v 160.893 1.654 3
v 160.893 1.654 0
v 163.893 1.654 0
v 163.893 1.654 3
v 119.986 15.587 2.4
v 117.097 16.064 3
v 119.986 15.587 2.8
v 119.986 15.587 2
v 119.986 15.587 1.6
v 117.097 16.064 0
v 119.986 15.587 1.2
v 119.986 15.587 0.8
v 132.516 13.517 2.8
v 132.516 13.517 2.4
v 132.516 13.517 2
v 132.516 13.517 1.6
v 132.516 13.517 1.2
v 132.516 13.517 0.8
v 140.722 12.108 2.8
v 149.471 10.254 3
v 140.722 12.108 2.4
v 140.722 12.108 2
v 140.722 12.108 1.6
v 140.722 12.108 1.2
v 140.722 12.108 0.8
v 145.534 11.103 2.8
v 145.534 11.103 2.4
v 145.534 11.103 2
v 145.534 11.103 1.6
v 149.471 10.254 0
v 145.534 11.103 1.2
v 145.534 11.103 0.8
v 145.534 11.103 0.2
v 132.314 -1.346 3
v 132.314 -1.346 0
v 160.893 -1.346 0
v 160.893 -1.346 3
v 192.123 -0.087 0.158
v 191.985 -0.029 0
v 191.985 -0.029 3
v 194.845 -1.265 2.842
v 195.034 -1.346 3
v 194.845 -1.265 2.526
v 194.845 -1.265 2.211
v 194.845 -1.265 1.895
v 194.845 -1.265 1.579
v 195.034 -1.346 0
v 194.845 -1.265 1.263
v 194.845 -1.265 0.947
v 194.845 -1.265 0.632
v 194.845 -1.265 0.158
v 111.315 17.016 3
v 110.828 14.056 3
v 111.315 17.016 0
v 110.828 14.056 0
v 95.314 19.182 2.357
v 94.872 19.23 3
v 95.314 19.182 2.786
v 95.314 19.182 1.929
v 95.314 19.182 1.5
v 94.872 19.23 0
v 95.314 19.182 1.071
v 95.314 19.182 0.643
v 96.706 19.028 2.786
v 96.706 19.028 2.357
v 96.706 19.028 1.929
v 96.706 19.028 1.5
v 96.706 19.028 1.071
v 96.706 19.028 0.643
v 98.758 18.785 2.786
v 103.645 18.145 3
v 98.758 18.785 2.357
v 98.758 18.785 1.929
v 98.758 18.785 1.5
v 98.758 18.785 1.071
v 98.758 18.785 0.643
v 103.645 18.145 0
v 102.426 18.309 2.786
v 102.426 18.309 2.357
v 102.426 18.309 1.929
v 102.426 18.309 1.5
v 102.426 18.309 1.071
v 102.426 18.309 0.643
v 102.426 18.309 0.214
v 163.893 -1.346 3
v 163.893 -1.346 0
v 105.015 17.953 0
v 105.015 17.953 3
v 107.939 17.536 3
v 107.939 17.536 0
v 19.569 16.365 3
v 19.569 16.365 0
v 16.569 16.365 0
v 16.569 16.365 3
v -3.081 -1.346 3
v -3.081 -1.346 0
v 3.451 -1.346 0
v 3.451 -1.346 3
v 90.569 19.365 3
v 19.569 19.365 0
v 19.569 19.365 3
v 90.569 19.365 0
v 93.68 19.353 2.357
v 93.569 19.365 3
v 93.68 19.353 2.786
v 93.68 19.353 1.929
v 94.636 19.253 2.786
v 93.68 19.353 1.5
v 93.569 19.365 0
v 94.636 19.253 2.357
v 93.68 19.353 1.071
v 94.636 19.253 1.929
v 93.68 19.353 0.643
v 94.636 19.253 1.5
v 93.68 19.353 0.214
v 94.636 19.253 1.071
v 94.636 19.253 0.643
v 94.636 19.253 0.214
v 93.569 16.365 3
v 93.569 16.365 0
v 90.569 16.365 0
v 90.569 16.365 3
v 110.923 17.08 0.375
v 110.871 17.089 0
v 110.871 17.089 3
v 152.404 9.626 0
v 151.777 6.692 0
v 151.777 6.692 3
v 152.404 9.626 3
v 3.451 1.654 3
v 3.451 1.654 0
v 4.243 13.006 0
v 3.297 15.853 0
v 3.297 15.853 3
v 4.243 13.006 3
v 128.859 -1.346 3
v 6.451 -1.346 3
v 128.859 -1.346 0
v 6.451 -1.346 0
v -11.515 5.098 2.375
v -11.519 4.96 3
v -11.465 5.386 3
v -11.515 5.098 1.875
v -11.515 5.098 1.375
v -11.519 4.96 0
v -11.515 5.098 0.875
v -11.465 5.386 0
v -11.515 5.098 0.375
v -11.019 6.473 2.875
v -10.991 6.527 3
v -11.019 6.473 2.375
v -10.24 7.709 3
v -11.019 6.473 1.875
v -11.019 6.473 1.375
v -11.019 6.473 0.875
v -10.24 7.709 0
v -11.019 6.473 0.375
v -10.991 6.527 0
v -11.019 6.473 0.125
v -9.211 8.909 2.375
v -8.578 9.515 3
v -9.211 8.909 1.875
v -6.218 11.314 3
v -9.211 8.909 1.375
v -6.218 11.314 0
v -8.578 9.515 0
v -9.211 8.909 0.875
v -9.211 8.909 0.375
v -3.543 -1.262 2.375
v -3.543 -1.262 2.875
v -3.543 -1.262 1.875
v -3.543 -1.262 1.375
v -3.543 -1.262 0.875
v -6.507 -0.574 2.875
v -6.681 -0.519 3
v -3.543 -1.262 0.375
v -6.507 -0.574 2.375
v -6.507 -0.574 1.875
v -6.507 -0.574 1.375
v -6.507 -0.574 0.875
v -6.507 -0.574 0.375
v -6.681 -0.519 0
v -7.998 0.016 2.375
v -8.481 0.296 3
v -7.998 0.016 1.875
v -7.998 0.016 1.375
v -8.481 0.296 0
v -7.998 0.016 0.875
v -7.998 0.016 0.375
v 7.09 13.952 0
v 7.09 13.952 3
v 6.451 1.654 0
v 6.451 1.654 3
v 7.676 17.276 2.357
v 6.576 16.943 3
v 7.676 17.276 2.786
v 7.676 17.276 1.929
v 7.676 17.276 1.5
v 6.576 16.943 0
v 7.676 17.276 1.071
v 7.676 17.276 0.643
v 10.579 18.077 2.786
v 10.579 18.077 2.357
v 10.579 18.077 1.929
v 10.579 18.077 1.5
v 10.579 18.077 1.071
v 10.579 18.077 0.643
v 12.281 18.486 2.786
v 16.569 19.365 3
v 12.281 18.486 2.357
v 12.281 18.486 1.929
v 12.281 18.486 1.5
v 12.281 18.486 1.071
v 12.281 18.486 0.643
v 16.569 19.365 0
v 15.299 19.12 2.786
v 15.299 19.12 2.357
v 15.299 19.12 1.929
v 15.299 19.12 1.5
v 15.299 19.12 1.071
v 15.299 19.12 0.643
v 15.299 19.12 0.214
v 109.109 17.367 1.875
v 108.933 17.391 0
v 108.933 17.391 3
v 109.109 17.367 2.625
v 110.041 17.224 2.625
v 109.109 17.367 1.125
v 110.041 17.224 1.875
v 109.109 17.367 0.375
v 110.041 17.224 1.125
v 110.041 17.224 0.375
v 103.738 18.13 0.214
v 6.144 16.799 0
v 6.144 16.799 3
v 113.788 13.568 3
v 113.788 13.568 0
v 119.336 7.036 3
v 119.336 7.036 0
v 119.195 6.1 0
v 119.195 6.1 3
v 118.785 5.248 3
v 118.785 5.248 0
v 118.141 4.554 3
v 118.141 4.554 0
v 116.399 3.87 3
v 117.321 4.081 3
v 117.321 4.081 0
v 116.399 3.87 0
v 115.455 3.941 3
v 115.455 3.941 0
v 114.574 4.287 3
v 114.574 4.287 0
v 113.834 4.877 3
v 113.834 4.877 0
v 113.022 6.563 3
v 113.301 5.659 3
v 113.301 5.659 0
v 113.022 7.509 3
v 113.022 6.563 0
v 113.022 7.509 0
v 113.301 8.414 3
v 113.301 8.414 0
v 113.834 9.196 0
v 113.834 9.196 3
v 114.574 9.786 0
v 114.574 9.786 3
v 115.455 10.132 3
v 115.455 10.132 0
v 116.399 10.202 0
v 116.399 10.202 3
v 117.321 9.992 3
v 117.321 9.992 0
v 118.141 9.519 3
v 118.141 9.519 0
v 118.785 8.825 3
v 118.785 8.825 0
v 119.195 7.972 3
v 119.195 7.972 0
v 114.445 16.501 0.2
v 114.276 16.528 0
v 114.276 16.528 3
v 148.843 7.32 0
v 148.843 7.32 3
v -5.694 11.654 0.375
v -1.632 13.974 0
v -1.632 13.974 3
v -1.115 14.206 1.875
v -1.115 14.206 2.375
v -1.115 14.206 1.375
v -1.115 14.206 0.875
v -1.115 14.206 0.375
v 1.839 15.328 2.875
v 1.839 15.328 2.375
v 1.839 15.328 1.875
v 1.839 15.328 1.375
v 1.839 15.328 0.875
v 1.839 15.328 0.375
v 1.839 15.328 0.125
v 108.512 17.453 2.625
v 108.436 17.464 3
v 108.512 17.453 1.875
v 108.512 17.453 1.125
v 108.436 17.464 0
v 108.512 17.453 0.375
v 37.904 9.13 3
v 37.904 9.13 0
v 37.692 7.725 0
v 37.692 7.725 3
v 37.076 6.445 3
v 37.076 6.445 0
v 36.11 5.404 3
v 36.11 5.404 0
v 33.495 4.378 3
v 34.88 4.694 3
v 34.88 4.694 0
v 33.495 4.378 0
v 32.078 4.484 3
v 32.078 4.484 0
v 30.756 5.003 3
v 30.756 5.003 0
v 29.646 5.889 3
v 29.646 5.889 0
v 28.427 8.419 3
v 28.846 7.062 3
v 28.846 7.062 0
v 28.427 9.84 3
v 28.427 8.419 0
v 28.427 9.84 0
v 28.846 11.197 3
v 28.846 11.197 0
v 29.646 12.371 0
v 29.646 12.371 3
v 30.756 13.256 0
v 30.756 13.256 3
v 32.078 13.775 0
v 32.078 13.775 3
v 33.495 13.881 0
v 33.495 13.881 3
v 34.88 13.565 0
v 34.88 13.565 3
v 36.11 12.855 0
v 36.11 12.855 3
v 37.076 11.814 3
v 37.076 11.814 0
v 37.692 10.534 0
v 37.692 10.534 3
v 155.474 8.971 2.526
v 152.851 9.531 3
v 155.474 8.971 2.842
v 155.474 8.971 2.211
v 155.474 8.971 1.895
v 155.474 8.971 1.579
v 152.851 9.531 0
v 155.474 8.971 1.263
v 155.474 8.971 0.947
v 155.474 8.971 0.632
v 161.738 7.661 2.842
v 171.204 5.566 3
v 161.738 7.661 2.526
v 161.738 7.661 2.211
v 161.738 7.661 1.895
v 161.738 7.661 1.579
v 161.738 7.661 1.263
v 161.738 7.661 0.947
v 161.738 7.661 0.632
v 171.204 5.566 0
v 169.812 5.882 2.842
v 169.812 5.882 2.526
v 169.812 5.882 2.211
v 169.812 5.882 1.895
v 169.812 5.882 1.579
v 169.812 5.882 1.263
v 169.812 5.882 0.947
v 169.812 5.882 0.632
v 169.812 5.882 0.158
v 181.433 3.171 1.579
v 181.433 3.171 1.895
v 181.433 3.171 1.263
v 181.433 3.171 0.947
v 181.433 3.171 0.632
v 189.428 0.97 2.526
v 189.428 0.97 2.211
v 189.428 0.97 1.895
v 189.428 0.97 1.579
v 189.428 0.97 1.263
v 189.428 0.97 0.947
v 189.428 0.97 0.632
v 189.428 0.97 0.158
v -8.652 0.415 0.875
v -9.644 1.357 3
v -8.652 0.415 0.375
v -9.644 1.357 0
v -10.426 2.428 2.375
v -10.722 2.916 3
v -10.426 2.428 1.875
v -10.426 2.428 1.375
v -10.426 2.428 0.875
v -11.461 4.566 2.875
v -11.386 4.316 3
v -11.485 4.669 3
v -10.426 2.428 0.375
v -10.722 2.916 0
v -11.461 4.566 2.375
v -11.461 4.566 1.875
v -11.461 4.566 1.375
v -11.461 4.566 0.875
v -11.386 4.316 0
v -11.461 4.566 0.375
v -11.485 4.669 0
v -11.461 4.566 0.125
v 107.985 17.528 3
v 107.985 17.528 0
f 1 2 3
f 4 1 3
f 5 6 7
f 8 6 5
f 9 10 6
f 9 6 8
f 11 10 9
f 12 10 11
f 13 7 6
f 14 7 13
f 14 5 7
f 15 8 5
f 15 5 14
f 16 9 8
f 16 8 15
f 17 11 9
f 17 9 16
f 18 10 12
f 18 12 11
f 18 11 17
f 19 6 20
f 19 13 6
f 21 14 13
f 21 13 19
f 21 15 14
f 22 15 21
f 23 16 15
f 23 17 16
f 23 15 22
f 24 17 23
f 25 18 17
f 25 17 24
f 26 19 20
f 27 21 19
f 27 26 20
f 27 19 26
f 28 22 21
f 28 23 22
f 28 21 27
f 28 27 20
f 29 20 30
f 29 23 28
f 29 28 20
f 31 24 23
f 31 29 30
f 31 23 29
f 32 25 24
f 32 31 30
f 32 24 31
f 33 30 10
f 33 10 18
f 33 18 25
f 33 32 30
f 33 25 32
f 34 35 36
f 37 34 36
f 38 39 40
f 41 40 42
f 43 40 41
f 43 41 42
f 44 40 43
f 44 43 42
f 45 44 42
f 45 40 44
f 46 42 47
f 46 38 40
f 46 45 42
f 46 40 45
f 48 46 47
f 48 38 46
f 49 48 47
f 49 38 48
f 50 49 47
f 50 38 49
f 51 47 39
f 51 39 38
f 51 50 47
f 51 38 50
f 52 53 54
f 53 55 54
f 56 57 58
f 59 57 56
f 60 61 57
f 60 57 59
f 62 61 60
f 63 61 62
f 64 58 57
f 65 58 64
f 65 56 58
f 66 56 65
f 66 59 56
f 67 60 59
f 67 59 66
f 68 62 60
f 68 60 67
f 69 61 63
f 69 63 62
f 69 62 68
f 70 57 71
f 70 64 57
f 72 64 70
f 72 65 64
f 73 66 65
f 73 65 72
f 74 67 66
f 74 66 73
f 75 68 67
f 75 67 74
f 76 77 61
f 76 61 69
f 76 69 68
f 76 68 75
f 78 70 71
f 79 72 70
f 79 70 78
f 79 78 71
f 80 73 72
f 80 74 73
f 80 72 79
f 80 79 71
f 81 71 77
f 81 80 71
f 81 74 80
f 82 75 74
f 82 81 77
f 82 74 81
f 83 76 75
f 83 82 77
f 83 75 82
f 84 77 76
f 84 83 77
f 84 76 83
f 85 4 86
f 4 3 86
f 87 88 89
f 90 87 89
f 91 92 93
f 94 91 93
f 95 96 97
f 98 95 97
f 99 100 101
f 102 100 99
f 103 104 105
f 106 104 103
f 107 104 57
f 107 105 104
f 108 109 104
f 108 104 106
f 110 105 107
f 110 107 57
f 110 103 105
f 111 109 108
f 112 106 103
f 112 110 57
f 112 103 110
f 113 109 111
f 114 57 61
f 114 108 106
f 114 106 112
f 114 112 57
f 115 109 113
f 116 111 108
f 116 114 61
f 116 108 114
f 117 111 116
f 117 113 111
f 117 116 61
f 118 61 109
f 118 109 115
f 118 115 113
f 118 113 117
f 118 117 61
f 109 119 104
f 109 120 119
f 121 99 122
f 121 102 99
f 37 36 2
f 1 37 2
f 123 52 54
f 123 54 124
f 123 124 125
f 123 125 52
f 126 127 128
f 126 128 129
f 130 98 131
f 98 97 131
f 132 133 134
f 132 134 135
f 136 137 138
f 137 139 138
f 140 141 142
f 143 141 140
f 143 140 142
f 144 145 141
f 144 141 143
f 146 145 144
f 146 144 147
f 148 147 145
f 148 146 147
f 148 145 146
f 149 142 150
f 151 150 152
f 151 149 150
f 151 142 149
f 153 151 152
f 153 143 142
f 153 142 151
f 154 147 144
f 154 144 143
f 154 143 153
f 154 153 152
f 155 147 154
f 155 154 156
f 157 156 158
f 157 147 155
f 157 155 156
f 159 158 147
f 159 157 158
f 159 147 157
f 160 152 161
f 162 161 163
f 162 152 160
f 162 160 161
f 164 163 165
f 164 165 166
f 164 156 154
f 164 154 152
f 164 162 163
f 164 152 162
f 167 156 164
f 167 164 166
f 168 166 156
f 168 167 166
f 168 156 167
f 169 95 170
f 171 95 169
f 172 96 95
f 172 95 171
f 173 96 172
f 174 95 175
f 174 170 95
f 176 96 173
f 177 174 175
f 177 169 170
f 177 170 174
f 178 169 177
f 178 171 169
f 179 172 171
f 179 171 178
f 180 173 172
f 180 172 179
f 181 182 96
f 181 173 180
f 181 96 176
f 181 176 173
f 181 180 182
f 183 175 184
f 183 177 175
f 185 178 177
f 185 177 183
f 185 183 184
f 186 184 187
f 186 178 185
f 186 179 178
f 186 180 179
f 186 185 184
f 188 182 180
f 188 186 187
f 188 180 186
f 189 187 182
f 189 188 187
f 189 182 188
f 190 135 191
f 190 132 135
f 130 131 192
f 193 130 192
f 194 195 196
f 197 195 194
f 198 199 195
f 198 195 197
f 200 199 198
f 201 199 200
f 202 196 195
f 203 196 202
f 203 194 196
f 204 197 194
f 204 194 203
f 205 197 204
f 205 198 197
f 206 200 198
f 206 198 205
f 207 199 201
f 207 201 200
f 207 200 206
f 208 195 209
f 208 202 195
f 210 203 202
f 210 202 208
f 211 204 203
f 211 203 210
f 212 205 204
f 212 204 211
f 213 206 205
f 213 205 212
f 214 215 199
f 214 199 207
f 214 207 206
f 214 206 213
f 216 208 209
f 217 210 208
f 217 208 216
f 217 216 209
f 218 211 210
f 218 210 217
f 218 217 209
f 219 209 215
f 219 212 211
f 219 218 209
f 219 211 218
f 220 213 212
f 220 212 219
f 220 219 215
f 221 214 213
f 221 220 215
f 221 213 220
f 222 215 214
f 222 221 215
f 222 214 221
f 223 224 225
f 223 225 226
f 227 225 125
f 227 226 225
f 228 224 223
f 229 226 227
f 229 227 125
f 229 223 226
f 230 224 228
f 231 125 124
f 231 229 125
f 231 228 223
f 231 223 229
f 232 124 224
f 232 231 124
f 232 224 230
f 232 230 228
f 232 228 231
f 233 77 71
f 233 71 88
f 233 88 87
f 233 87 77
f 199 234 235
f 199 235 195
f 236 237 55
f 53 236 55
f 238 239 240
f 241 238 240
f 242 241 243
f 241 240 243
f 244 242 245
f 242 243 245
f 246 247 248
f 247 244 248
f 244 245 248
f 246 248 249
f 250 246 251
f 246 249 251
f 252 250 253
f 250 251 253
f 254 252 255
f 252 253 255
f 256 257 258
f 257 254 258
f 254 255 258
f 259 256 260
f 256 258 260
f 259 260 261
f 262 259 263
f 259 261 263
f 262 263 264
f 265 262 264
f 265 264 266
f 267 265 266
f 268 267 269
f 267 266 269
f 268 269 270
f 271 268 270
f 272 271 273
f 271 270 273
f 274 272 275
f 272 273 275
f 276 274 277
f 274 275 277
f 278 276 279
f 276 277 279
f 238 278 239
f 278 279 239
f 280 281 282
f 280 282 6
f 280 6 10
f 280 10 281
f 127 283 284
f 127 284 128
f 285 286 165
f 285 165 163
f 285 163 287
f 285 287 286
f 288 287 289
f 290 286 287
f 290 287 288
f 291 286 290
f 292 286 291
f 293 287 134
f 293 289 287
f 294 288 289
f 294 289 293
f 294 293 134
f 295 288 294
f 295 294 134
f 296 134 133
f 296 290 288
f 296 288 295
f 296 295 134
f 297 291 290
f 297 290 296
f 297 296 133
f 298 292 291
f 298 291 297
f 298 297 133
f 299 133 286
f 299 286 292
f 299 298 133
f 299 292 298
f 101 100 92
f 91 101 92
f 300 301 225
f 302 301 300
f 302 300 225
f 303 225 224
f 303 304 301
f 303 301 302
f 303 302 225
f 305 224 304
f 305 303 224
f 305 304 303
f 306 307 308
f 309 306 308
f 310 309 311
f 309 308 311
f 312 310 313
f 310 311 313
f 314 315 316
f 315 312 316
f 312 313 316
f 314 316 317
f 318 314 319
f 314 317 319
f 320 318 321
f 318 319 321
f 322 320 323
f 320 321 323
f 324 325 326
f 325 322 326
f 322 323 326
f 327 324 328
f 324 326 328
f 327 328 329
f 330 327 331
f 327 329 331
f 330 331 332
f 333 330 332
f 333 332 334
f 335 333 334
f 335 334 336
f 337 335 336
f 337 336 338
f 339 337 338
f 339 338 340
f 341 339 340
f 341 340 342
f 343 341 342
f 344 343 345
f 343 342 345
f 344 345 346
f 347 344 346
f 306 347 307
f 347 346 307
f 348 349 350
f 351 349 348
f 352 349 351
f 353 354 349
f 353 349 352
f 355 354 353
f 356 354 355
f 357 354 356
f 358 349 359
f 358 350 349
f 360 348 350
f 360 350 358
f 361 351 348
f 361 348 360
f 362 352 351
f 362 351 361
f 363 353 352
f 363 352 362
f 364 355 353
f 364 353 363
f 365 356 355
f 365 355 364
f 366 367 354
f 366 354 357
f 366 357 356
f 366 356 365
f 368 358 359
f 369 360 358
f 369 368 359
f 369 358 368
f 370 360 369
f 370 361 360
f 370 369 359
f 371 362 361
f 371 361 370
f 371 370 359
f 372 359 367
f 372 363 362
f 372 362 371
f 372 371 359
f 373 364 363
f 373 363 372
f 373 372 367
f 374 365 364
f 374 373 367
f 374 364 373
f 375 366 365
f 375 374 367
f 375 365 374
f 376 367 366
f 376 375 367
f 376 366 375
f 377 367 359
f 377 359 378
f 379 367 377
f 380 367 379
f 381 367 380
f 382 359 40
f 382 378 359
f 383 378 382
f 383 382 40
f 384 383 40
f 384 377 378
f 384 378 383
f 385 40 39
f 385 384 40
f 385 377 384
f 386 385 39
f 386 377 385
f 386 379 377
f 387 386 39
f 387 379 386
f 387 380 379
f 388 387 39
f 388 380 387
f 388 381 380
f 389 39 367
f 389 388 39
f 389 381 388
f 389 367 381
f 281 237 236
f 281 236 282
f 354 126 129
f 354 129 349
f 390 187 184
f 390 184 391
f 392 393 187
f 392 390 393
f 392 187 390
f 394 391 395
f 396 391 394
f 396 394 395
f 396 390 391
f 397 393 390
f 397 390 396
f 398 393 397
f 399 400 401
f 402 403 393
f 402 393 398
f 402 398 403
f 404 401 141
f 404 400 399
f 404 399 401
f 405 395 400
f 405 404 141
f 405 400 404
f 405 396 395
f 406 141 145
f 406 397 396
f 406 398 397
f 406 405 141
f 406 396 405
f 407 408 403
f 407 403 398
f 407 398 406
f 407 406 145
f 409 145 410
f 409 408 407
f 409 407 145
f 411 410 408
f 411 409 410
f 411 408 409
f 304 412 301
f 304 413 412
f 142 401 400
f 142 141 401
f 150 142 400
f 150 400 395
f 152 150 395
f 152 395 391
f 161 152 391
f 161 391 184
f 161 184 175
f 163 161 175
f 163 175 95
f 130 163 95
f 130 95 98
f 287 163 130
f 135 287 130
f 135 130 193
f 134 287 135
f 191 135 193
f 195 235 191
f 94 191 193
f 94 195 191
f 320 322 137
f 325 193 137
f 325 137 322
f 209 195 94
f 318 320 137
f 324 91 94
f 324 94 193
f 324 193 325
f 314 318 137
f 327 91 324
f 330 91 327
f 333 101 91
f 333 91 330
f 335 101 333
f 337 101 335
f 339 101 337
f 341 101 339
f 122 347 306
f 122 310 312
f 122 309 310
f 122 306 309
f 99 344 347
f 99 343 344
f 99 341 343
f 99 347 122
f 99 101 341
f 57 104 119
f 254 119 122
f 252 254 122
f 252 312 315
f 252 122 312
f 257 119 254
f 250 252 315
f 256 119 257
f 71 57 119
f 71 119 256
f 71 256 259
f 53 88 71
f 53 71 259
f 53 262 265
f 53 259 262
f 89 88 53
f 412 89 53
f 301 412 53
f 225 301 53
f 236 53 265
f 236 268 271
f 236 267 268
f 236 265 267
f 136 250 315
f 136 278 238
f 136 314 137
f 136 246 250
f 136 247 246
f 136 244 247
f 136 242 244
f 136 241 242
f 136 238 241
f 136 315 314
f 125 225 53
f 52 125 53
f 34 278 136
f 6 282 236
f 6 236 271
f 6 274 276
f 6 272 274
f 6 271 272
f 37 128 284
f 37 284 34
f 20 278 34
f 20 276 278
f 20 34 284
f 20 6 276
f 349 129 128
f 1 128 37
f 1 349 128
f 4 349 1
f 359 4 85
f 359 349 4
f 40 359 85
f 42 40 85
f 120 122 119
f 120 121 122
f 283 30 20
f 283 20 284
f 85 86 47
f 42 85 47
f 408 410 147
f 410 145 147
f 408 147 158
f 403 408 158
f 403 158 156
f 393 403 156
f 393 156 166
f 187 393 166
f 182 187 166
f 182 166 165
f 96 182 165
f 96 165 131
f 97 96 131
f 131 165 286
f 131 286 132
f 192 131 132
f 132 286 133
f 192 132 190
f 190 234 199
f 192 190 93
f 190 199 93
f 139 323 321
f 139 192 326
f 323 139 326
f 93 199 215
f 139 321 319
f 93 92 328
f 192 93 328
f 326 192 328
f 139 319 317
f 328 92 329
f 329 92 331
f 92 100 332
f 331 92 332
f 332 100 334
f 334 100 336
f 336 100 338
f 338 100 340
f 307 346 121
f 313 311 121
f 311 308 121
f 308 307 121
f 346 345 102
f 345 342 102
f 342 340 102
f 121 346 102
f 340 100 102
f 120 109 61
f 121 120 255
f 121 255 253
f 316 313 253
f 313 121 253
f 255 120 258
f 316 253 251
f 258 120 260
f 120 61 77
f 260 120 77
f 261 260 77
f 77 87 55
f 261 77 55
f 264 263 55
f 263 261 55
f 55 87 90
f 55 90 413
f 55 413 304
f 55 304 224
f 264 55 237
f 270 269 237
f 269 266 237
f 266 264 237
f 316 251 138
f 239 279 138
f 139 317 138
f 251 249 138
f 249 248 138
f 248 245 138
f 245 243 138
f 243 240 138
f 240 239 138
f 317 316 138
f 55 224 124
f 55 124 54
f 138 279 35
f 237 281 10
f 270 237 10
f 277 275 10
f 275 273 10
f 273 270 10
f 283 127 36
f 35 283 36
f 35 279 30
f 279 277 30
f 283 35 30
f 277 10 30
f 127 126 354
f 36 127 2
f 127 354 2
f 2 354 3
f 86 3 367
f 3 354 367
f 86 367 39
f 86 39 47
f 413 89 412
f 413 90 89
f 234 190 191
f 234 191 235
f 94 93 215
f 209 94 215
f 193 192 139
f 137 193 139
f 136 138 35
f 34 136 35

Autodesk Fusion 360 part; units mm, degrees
sketch "Sketch1" plane through (0, 0, 0) normal (0, 0, 1) x (1, 0, 0) in component "Airfoil structure"
  spline S0 degree 5 poles (152.8506, 9.5306) (153.6754, 9.3537) (155.1958, 9.0287) (157.0885, 8.6275) (158.936, 8.2427) (160.6637, 7.8881) (162.4454, 7.5151) (164.8303, 6.998) (168.0437, 6.2836) (171.9513, 5.3996) (176.2204, 4.4167) (180.4193, 3.4264) (184.1364, 2.5129) (187.0894, 1.7283) (189.2467, 1.0645) (190.9412, 0.4268) (192.3181, -0.1665) (193.5665, -0.7111) (194.5238, -1.126) (195.0337, -1.3464) knots 0 0 0 0 0 0 0.066667 0.133333 0.2 0.266667 0.333333 0.4 0.466667 0.533333 0.6 0.666667 0.733333 0.8 0.866667 0.933333 1 1 1 1 1 1
  line L0 (148.4907, 10.4656) -> (157.2105, 8.5955)
  line L1 (191.9852, -0.0289) -> (198.0822, -2.6639)
  circle A0 centre (33.1388, 9.1296) radius 4.765
  circle A1 centre (116.1615, 7.0362) radius 3.175
  spline S1 degree 5 poles (-3.081, -1.3464) (-3.6016, -1.2536) (-4.5414, -1.0763) (-5.6463, -0.8353) (-6.5938, -0.5669) (-7.329, -0.2953) (-8.0513, 0.0089) (-9.0194, 0.5707) (-10.0683, 1.7874) (-10.9642, 3.2518) (-11.5103, 4.4866) (-11.5777, 5.0951) (-11.407, 5.643) (-11.0112, 6.6067) (-10.1307, 7.993) (-8.6022, 9.6431) (-6.4035, 11.272) (-4.1965, 12.5715) (-2.7349, 13.4061) (-1.8316, 13.8946) (-1.0216, 14.2664) (0.0955, 14.6934) (1.459, 15.1916) (2.6392, 15.6173) (3.2971, 15.8534) knots 0 0 0 0 0 0 0.05 0.1 0.15 0.2 0.25 0.3 0.35 0.4 0.45 0.5 0.55 0.6 0.65 0.7 0.75 0.8 0.85 0.9 0.95 1 1 1 1 1 1
  line L2 (0.5703, -1.9971) -> (-6.7323, -0.6957)
  line L3 (-0.0118, 14.6656) -> (6.606, 17.0412)
  line L4 (-8.4792, 9.8153) -> (-3.9569, 12.8132)
  line L5 (-11.5034, 4.2257) -> (-11.5345, 5.6935)
  line L6 (-7.2174, -0.5359) -> (-9.7443, 1.1286)
  line L7 (19.5688, 19.3646) -> (90.5688, 19.3646)
  spline S2 degree 5 poles (93.5688, 19.3646) (93.8188, 19.3387) (94.2829, 19.2905) (94.8714, 19.229) (95.4658, 19.1659) (96.0263, 19.1049) (96.567, 19.0445) (97.2368, 18.9678) (98.1315, 18.8622) (99.313, 18.7173) (100.8214, 18.5245) (102.3118, 18.3263) (103.5973, 18.1504) (104.53, 18.0207) (105.0153, 17.9528) knots 0 0 0 0 0 0 0.1 0.2 0.3 0.4 0.5 0.6 0.7 0.8 0.9 1 1 1 1 1 1
  line L8 (92.266, 19.4996) -> (94.8715, 19.2297)
  line L9 (103.6448, 18.1447) -> (106.3858, 17.761)
  spline S3 degree 5 poles (6.5765, 16.943) (6.9079, 17.0449) (7.5374, 17.2364) (8.3817, 17.4868) (9.3156, 17.7508) (10.2084, 17.9865) (10.8922, 18.156) (11.4504, 18.29) (11.9864, 18.4184) (12.6265, 18.5675) (13.504, 18.76) (14.4962, 18.9637) (15.447, 19.1503) (16.1786, 19.2906) (16.5688, 19.3646) knots 0 0 0 0 0 0 0.1 0.2 0.3 0.4 0.5 0.6 0.7 0.8 0.9 1 1 1 1 1 1
  line L10 (5.4107, 16.5846) -> (7.7424, 17.3015)
  line L11 (15.2328, 19.111) -> (17.9048, 19.6183)
  line L12 (152.4045, 9.626) -> (152.8506, 9.5306)
  line L13 (107.9851, 17.5282) -> (108.4359, 17.4637)
  line L14 (6.1441, 16.7993) -> (6.5765, 16.943)
  line L15 (128.8588, -1.3464) -> (132.3138, -1.3464)
  line L16 (149.471, 10.2539) -> (148.8431, 7.3203)
  line L17 (148.8431, 7.3203) -> (151.7767, 6.6925)
  line L18 (151.7767, 6.6925) -> (152.4045, 9.626)
  line L19 (3.2971, 15.8534) -> (4.243, 13.0064)
  line L20 (4.243, 13.0064) -> (7.09, 13.9524)
  line L21 (7.09, 13.9524) -> (6.1441, 16.7993)
  line L22 (160.8934, -1.3464) -> (160.8934, 1.6536)
  line L23 (160.8934, 1.6536) -> (163.8934, 1.6536)
  line L24 (163.8934, 1.6536) -> (163.8934, -1.3464)
  line L25 (132.3138, -1.3464) -> (160.8934, -1.3464)
  line L26 (163.8934, -1.3464) -> (195.0337, -1.3464)
  line L27 (3.4513, -1.3464) -> (3.4513, 1.6536)
  line L28 (3.4513, 1.6536) -> (6.4513, 1.6536)
  line L29 (6.4513, 1.6536) -> (6.4513, -1.3464)
  line L30 (-3.081, -1.3464) -> (3.4513, -1.3464)
  line L31 (6.4513, -1.3464) -> (128.8588, -1.3464)
  line L32 (105.0153, 17.9528) -> (107.9851, 17.5282)
  line L33 (19.5688, 19.3646) -> (19.5688, 16.3646)
  line L34 (19.5688, 16.3646) -> (16.5688, 16.3646)
  line L35 (16.5688, 16.3646) -> (16.5688, 19.3646)
  line L36 (90.5688, 19.3646) -> (90.5688, 16.3646)
  line L37 (90.5688, 16.3646) -> (93.5688, 16.3646)
  line L38 (93.5688, 16.3646) -> (93.5688, 19.3646)
  line L39 (113.7881, 13.5683) -> (110.8279, 14.0557)
  line L40 (110.8279, 14.0557) -> (111.3153, 17.0159)
  line L41 (113.7881, 13.5683) -> (114.2755, 16.5285)
  spline S4 degree 5 poles (108.4359, 17.4637) (108.6467, 17.433) (108.9931, 17.3831) (109.2865, 17.3426) (109.4547, 17.3194) (110.0313, 17.2264) (110.7239, 17.113) (111.2088, 17.0334) (111.3153, 17.0159) knots 0 0 0 0 0 0 0.066667 0.133333 0.2 0.217791 0.217791 0.217791 0.217791 0.217791 0.217791
  line L42 (107.9387, 17.5361) -> (108.933, 17.3913)
  line L43 (110.8712, 17.0888) -> (111.7595, 16.9429)
  spline S5 degree 5 poles (114.2755, 16.5285) (114.6969, 16.4591) (115.8472, 16.2695) (117.9388, 15.9249) (121.2621, 15.3773) (125.9027, 14.6124) (130.8234, 13.7994) (135.1309, 13.0827) (138.47, 12.5166) (140.7881, 12.1042) (142.4392, 11.78) (143.9897, 11.4433) (145.6466, 11.0766) (147.3521, 10.7068) (148.7253, 10.4127) (149.471, 10.2539) knots 0.291405 0.291405 0.291405 0.291405 0.291405 0.291405 0.333333 0.4 0.466667 0.533333 0.6 0.666667 0.733333 0.8 0.866667 0.933333 1 1 1 1 1 1
  line L44 (111.4536, 16.9935) -> (117.0973, 16.0636)
  line L45 (143.5745, 11.5101) -> (155.3674, 8.9976)
  point P0 (-8.4808, 0.2964)
  point P1 (-11.5189, 4.9596)
  point P2 (-6.2181, 11.3142)
  point P3 (11.4183, 18.2822)
  point P4 (96.5722, 19.0435)
  point P5 (109.7229, 17.2753)
  point P6 (137.8507, 12.6179)
  point P7 (163.7248, 7.2358)
  point P8 (186.791, 1.7868)
  dimension "d38" = 77
  dimension "d53" = 9.53
  dimension "d54" = 6.35
  dimension "d59" = 3
extrude "Extrude2" add sketch "Sketch1" along normal blind 3 contours S0 L0 L1 S1 L7 S2 L8 L9 S3 L12 L13 L14 L15 L16 L17 L18 L19 L20 L21 L22 L23 L24 L25 L26 L27 L28 L29 L30 L31 L32 L33 L34 L35 L36 L37 L38 L39 L40 L41 S4 L42 L43 S5 L44
sketch "lazercut" plane through (0, 0, 3) normal (0, 0, 1) x (1, 0, 0)
  circle A0 centre (33.1388, 9.1296) radius 4.765
  circle A1 centre (116.1615, 7.0362) radius 3.175
  line L0 (113.7881, 13.5683) -> (110.8279, 14.0557)
  line L1 (110.8279, 14.0557) -> (111.3153, 17.0159)
  spline S0 degree 5 poles (111.3153, 17.0159) (111.2088, 17.0334) (110.7239, 17.113) (110.0313, 17.2264) (109.4547, 17.3194) (109.2865, 17.3426) (108.9931, 17.3831) (108.6467, 17.433) (108.4359, 17.4637) knots -0.217791 -0.217791 -0.217791 -0.217791 -0.217791 -0.217791 -0.2 -0.133333 -0.066667 0 0 0 0 0 0
  line L2 (108.4359, 17.4637) -> (105.0153, 17.9528)
  spline S1 degree 5 poles (105.0153, 17.9528) (104.53, 18.0207) (103.5973, 18.1504) (102.3118, 18.3263) (100.8214, 18.5245) (99.313, 18.7173) (98.1315, 18.8622) (97.2368, 18.9678) (96.567, 19.0445) (96.0263, 19.1049) (95.4658, 19.1659) (94.8714, 19.229) (94.2829, 19.2905) (93.8188, 19.3387) (93.5688, 19.3646) knots -1 -1 -1 -1 -1 -1 -0.9 -0.8 -0.7 -0.6 -0.5 -0.4 -0.3 -0.2 -0.1 0 0 0 0 0 0
  line L3 (93.5688, 19.3646) -> (93.5688, 16.3646)
  line L4 (93.5688, 16.3646) -> (90.5688, 16.3646)
  line L5 (90.5688, 16.3646) -> (90.5688, 19.3646)
  line L6 (90.5688, 19.3646) -> (19.5688, 19.3646)
  line L7 (19.5688, 19.3646) -> (19.5688, 16.3646)
  line L8 (19.5688, 16.3646) -> (16.5688, 16.3646)
  line L9 (16.5688, 16.3646) -> (16.5688, 19.3646)
  spline S2 degree 5 poles (16.5688, 19.3646) (16.1786, 19.2906) (15.447, 19.1503) (14.4962, 18.9637) (13.504, 18.76) (12.6265, 18.5675) (11.9864, 18.4184) (11.4504, 18.29) (10.8922, 18.156) (10.2084, 17.9865) (9.3156, 17.7508) (8.3817, 17.4868) (7.5374, 17.2364) (6.9079, 17.0449) (6.5765, 16.943) knots -1 -1 -1 -1 -1 -1 -0.9 -0.8 -0.7 -0.6 -0.5 -0.4 -0.3 -0.2 -0.1 0 0 0 0 0 0
  line L10 (6.5765, 16.943) -> (6.1441, 16.7993)
  line L11 (6.1441, 16.7993) -> (7.09, 13.9524)
  line L12 (7.09, 13.9524) -> (4.243, 13.0064)
  line L13 (4.243, 13.0064) -> (3.2971, 15.8534)
  spline S3 degree 5 poles (3.2971, 15.8534) (2.6392, 15.6173) (1.459, 15.1916) (0.0955, 14.6934) (-1.0216, 14.2664) (-1.8316, 13.8946) (-2.7349, 13.4061) (-4.1965, 12.5715) (-6.4035, 11.272) (-8.6022, 9.6431) (-10.1307, 7.993) (-11.0112, 6.6067) (-11.407, 5.643) (-11.5777, 5.0951) (-11.5103, 4.4866) (-10.9642, 3.2518) (-10.0683, 1.7874) (-9.0194, 0.5707) (-8.0513, 0.0089) (-7.329, -0.2953) (-6.5938, -0.5669) (-5.6463, -0.8353) (-4.5414, -1.0763) (-3.6016, -1.2536) (-3.081, -1.3464) knots -1 -1 -1 -1 -1 -1 -0.95 -0.9 -0.85 -0.8 -0.75 -0.7 -0.65 -0.6 -0.55 -0.5 -0.45 -0.4 -0.35 -0.3 -0.25 -0.2 -0.15 -0.1 -0.05 0 0 0 0 0 0
  line L14 (-3.081, -1.3464) -> (3.4513, -1.3464)
  line L15 (3.4513, -1.3464) -> (3.4513, 1.6536)
  line L16 (3.4513, 1.6536) -> (6.4513, 1.6536)
  line L17 (6.4513, 1.6536) -> (6.4513, -1.3464)
  line L18 (6.4513, -1.3464) -> (160.8934, -1.3464)
  line L19 (160.8934, -1.3464) -> (160.8934, 1.6536)
  line L20 (160.8934, 1.6536) -> (163.8934, 1.6536)
  line L21 (163.8934, 1.6536) -> (163.8934, -1.3464)
  line L22 (163.8934, -1.3464) -> (195.0337, -1.3464)
  spline S4 degree 5 poles (195.0337, -1.3464) (194.5238, -1.126) (193.5665, -0.7111) (192.3181, -0.1665) (190.9412, 0.4268) (189.2467, 1.0645) (187.0894, 1.7283) (184.1364, 2.5129) (180.4193, 3.4264) (176.2204, 4.4167) (171.9513, 5.3996) (168.0437, 6.2836) (164.8303, 6.998) (162.4454, 7.5151) (160.6637, 7.8881) (158.936, 8.2427) (157.0885, 8.6275) (155.1958, 9.0287) (153.6754, 9.3537) (152.8506, 9.5306) knots -1 -1 -1 -1 -1 -1 -0.933333 -0.866667 -0.8 -0.733333 -0.666667 -0.6 -0.533333 -0.466667 -0.4 -0.333333 -0.266667 -0.2 -0.133333 -0.066667 0 0 0 0 0 0
  line L23 (152.8506, 9.5306) -> (152.4045, 9.626)
  line L24 (152.4045, 9.626) -> (151.7767, 6.6925)
  line L25 (151.7767, 6.6925) -> (148.8431, 7.3203)
  line L26 (148.8431, 7.3203) -> (149.471, 10.2539)
  spline S5 degree 5 poles (149.471, 10.2539) (148.7253, 10.4127) (147.3521, 10.7068) (145.6466, 11.0766) (143.9897, 11.4433) (142.4392, 11.78) (140.7881, 12.1042) (138.47, 12.5166) (135.1309, 13.0827) (130.8234, 13.7994) (125.9027, 14.6124) (121.2621, 15.3773) (117.9388, 15.9249) (115.8472, 16.2695) (114.6969, 16.4591) (114.2755, 16.5285) knots -1 -1 -1 -1 -1 -1 -0.933333 -0.866667 -0.8 -0.733333 -0.666667 -0.6 -0.533333 -0.466667 -0.4 -0.333333 -0.291405 -0.291405 -0.291405 -0.291405 -0.291405 -0.291405
  line L27 (114.2755, 16.5285) -> (113.7881, 13.5683)
sketch "Sketch3" plane through (0, 0, 0) normal (0, 0, 1) x (1, 0, 0)
component "Airfoil structure" placed x (1, 0, 0) y (0, 1, 0) z (0, 0, 1) at (0, 0, 0)
